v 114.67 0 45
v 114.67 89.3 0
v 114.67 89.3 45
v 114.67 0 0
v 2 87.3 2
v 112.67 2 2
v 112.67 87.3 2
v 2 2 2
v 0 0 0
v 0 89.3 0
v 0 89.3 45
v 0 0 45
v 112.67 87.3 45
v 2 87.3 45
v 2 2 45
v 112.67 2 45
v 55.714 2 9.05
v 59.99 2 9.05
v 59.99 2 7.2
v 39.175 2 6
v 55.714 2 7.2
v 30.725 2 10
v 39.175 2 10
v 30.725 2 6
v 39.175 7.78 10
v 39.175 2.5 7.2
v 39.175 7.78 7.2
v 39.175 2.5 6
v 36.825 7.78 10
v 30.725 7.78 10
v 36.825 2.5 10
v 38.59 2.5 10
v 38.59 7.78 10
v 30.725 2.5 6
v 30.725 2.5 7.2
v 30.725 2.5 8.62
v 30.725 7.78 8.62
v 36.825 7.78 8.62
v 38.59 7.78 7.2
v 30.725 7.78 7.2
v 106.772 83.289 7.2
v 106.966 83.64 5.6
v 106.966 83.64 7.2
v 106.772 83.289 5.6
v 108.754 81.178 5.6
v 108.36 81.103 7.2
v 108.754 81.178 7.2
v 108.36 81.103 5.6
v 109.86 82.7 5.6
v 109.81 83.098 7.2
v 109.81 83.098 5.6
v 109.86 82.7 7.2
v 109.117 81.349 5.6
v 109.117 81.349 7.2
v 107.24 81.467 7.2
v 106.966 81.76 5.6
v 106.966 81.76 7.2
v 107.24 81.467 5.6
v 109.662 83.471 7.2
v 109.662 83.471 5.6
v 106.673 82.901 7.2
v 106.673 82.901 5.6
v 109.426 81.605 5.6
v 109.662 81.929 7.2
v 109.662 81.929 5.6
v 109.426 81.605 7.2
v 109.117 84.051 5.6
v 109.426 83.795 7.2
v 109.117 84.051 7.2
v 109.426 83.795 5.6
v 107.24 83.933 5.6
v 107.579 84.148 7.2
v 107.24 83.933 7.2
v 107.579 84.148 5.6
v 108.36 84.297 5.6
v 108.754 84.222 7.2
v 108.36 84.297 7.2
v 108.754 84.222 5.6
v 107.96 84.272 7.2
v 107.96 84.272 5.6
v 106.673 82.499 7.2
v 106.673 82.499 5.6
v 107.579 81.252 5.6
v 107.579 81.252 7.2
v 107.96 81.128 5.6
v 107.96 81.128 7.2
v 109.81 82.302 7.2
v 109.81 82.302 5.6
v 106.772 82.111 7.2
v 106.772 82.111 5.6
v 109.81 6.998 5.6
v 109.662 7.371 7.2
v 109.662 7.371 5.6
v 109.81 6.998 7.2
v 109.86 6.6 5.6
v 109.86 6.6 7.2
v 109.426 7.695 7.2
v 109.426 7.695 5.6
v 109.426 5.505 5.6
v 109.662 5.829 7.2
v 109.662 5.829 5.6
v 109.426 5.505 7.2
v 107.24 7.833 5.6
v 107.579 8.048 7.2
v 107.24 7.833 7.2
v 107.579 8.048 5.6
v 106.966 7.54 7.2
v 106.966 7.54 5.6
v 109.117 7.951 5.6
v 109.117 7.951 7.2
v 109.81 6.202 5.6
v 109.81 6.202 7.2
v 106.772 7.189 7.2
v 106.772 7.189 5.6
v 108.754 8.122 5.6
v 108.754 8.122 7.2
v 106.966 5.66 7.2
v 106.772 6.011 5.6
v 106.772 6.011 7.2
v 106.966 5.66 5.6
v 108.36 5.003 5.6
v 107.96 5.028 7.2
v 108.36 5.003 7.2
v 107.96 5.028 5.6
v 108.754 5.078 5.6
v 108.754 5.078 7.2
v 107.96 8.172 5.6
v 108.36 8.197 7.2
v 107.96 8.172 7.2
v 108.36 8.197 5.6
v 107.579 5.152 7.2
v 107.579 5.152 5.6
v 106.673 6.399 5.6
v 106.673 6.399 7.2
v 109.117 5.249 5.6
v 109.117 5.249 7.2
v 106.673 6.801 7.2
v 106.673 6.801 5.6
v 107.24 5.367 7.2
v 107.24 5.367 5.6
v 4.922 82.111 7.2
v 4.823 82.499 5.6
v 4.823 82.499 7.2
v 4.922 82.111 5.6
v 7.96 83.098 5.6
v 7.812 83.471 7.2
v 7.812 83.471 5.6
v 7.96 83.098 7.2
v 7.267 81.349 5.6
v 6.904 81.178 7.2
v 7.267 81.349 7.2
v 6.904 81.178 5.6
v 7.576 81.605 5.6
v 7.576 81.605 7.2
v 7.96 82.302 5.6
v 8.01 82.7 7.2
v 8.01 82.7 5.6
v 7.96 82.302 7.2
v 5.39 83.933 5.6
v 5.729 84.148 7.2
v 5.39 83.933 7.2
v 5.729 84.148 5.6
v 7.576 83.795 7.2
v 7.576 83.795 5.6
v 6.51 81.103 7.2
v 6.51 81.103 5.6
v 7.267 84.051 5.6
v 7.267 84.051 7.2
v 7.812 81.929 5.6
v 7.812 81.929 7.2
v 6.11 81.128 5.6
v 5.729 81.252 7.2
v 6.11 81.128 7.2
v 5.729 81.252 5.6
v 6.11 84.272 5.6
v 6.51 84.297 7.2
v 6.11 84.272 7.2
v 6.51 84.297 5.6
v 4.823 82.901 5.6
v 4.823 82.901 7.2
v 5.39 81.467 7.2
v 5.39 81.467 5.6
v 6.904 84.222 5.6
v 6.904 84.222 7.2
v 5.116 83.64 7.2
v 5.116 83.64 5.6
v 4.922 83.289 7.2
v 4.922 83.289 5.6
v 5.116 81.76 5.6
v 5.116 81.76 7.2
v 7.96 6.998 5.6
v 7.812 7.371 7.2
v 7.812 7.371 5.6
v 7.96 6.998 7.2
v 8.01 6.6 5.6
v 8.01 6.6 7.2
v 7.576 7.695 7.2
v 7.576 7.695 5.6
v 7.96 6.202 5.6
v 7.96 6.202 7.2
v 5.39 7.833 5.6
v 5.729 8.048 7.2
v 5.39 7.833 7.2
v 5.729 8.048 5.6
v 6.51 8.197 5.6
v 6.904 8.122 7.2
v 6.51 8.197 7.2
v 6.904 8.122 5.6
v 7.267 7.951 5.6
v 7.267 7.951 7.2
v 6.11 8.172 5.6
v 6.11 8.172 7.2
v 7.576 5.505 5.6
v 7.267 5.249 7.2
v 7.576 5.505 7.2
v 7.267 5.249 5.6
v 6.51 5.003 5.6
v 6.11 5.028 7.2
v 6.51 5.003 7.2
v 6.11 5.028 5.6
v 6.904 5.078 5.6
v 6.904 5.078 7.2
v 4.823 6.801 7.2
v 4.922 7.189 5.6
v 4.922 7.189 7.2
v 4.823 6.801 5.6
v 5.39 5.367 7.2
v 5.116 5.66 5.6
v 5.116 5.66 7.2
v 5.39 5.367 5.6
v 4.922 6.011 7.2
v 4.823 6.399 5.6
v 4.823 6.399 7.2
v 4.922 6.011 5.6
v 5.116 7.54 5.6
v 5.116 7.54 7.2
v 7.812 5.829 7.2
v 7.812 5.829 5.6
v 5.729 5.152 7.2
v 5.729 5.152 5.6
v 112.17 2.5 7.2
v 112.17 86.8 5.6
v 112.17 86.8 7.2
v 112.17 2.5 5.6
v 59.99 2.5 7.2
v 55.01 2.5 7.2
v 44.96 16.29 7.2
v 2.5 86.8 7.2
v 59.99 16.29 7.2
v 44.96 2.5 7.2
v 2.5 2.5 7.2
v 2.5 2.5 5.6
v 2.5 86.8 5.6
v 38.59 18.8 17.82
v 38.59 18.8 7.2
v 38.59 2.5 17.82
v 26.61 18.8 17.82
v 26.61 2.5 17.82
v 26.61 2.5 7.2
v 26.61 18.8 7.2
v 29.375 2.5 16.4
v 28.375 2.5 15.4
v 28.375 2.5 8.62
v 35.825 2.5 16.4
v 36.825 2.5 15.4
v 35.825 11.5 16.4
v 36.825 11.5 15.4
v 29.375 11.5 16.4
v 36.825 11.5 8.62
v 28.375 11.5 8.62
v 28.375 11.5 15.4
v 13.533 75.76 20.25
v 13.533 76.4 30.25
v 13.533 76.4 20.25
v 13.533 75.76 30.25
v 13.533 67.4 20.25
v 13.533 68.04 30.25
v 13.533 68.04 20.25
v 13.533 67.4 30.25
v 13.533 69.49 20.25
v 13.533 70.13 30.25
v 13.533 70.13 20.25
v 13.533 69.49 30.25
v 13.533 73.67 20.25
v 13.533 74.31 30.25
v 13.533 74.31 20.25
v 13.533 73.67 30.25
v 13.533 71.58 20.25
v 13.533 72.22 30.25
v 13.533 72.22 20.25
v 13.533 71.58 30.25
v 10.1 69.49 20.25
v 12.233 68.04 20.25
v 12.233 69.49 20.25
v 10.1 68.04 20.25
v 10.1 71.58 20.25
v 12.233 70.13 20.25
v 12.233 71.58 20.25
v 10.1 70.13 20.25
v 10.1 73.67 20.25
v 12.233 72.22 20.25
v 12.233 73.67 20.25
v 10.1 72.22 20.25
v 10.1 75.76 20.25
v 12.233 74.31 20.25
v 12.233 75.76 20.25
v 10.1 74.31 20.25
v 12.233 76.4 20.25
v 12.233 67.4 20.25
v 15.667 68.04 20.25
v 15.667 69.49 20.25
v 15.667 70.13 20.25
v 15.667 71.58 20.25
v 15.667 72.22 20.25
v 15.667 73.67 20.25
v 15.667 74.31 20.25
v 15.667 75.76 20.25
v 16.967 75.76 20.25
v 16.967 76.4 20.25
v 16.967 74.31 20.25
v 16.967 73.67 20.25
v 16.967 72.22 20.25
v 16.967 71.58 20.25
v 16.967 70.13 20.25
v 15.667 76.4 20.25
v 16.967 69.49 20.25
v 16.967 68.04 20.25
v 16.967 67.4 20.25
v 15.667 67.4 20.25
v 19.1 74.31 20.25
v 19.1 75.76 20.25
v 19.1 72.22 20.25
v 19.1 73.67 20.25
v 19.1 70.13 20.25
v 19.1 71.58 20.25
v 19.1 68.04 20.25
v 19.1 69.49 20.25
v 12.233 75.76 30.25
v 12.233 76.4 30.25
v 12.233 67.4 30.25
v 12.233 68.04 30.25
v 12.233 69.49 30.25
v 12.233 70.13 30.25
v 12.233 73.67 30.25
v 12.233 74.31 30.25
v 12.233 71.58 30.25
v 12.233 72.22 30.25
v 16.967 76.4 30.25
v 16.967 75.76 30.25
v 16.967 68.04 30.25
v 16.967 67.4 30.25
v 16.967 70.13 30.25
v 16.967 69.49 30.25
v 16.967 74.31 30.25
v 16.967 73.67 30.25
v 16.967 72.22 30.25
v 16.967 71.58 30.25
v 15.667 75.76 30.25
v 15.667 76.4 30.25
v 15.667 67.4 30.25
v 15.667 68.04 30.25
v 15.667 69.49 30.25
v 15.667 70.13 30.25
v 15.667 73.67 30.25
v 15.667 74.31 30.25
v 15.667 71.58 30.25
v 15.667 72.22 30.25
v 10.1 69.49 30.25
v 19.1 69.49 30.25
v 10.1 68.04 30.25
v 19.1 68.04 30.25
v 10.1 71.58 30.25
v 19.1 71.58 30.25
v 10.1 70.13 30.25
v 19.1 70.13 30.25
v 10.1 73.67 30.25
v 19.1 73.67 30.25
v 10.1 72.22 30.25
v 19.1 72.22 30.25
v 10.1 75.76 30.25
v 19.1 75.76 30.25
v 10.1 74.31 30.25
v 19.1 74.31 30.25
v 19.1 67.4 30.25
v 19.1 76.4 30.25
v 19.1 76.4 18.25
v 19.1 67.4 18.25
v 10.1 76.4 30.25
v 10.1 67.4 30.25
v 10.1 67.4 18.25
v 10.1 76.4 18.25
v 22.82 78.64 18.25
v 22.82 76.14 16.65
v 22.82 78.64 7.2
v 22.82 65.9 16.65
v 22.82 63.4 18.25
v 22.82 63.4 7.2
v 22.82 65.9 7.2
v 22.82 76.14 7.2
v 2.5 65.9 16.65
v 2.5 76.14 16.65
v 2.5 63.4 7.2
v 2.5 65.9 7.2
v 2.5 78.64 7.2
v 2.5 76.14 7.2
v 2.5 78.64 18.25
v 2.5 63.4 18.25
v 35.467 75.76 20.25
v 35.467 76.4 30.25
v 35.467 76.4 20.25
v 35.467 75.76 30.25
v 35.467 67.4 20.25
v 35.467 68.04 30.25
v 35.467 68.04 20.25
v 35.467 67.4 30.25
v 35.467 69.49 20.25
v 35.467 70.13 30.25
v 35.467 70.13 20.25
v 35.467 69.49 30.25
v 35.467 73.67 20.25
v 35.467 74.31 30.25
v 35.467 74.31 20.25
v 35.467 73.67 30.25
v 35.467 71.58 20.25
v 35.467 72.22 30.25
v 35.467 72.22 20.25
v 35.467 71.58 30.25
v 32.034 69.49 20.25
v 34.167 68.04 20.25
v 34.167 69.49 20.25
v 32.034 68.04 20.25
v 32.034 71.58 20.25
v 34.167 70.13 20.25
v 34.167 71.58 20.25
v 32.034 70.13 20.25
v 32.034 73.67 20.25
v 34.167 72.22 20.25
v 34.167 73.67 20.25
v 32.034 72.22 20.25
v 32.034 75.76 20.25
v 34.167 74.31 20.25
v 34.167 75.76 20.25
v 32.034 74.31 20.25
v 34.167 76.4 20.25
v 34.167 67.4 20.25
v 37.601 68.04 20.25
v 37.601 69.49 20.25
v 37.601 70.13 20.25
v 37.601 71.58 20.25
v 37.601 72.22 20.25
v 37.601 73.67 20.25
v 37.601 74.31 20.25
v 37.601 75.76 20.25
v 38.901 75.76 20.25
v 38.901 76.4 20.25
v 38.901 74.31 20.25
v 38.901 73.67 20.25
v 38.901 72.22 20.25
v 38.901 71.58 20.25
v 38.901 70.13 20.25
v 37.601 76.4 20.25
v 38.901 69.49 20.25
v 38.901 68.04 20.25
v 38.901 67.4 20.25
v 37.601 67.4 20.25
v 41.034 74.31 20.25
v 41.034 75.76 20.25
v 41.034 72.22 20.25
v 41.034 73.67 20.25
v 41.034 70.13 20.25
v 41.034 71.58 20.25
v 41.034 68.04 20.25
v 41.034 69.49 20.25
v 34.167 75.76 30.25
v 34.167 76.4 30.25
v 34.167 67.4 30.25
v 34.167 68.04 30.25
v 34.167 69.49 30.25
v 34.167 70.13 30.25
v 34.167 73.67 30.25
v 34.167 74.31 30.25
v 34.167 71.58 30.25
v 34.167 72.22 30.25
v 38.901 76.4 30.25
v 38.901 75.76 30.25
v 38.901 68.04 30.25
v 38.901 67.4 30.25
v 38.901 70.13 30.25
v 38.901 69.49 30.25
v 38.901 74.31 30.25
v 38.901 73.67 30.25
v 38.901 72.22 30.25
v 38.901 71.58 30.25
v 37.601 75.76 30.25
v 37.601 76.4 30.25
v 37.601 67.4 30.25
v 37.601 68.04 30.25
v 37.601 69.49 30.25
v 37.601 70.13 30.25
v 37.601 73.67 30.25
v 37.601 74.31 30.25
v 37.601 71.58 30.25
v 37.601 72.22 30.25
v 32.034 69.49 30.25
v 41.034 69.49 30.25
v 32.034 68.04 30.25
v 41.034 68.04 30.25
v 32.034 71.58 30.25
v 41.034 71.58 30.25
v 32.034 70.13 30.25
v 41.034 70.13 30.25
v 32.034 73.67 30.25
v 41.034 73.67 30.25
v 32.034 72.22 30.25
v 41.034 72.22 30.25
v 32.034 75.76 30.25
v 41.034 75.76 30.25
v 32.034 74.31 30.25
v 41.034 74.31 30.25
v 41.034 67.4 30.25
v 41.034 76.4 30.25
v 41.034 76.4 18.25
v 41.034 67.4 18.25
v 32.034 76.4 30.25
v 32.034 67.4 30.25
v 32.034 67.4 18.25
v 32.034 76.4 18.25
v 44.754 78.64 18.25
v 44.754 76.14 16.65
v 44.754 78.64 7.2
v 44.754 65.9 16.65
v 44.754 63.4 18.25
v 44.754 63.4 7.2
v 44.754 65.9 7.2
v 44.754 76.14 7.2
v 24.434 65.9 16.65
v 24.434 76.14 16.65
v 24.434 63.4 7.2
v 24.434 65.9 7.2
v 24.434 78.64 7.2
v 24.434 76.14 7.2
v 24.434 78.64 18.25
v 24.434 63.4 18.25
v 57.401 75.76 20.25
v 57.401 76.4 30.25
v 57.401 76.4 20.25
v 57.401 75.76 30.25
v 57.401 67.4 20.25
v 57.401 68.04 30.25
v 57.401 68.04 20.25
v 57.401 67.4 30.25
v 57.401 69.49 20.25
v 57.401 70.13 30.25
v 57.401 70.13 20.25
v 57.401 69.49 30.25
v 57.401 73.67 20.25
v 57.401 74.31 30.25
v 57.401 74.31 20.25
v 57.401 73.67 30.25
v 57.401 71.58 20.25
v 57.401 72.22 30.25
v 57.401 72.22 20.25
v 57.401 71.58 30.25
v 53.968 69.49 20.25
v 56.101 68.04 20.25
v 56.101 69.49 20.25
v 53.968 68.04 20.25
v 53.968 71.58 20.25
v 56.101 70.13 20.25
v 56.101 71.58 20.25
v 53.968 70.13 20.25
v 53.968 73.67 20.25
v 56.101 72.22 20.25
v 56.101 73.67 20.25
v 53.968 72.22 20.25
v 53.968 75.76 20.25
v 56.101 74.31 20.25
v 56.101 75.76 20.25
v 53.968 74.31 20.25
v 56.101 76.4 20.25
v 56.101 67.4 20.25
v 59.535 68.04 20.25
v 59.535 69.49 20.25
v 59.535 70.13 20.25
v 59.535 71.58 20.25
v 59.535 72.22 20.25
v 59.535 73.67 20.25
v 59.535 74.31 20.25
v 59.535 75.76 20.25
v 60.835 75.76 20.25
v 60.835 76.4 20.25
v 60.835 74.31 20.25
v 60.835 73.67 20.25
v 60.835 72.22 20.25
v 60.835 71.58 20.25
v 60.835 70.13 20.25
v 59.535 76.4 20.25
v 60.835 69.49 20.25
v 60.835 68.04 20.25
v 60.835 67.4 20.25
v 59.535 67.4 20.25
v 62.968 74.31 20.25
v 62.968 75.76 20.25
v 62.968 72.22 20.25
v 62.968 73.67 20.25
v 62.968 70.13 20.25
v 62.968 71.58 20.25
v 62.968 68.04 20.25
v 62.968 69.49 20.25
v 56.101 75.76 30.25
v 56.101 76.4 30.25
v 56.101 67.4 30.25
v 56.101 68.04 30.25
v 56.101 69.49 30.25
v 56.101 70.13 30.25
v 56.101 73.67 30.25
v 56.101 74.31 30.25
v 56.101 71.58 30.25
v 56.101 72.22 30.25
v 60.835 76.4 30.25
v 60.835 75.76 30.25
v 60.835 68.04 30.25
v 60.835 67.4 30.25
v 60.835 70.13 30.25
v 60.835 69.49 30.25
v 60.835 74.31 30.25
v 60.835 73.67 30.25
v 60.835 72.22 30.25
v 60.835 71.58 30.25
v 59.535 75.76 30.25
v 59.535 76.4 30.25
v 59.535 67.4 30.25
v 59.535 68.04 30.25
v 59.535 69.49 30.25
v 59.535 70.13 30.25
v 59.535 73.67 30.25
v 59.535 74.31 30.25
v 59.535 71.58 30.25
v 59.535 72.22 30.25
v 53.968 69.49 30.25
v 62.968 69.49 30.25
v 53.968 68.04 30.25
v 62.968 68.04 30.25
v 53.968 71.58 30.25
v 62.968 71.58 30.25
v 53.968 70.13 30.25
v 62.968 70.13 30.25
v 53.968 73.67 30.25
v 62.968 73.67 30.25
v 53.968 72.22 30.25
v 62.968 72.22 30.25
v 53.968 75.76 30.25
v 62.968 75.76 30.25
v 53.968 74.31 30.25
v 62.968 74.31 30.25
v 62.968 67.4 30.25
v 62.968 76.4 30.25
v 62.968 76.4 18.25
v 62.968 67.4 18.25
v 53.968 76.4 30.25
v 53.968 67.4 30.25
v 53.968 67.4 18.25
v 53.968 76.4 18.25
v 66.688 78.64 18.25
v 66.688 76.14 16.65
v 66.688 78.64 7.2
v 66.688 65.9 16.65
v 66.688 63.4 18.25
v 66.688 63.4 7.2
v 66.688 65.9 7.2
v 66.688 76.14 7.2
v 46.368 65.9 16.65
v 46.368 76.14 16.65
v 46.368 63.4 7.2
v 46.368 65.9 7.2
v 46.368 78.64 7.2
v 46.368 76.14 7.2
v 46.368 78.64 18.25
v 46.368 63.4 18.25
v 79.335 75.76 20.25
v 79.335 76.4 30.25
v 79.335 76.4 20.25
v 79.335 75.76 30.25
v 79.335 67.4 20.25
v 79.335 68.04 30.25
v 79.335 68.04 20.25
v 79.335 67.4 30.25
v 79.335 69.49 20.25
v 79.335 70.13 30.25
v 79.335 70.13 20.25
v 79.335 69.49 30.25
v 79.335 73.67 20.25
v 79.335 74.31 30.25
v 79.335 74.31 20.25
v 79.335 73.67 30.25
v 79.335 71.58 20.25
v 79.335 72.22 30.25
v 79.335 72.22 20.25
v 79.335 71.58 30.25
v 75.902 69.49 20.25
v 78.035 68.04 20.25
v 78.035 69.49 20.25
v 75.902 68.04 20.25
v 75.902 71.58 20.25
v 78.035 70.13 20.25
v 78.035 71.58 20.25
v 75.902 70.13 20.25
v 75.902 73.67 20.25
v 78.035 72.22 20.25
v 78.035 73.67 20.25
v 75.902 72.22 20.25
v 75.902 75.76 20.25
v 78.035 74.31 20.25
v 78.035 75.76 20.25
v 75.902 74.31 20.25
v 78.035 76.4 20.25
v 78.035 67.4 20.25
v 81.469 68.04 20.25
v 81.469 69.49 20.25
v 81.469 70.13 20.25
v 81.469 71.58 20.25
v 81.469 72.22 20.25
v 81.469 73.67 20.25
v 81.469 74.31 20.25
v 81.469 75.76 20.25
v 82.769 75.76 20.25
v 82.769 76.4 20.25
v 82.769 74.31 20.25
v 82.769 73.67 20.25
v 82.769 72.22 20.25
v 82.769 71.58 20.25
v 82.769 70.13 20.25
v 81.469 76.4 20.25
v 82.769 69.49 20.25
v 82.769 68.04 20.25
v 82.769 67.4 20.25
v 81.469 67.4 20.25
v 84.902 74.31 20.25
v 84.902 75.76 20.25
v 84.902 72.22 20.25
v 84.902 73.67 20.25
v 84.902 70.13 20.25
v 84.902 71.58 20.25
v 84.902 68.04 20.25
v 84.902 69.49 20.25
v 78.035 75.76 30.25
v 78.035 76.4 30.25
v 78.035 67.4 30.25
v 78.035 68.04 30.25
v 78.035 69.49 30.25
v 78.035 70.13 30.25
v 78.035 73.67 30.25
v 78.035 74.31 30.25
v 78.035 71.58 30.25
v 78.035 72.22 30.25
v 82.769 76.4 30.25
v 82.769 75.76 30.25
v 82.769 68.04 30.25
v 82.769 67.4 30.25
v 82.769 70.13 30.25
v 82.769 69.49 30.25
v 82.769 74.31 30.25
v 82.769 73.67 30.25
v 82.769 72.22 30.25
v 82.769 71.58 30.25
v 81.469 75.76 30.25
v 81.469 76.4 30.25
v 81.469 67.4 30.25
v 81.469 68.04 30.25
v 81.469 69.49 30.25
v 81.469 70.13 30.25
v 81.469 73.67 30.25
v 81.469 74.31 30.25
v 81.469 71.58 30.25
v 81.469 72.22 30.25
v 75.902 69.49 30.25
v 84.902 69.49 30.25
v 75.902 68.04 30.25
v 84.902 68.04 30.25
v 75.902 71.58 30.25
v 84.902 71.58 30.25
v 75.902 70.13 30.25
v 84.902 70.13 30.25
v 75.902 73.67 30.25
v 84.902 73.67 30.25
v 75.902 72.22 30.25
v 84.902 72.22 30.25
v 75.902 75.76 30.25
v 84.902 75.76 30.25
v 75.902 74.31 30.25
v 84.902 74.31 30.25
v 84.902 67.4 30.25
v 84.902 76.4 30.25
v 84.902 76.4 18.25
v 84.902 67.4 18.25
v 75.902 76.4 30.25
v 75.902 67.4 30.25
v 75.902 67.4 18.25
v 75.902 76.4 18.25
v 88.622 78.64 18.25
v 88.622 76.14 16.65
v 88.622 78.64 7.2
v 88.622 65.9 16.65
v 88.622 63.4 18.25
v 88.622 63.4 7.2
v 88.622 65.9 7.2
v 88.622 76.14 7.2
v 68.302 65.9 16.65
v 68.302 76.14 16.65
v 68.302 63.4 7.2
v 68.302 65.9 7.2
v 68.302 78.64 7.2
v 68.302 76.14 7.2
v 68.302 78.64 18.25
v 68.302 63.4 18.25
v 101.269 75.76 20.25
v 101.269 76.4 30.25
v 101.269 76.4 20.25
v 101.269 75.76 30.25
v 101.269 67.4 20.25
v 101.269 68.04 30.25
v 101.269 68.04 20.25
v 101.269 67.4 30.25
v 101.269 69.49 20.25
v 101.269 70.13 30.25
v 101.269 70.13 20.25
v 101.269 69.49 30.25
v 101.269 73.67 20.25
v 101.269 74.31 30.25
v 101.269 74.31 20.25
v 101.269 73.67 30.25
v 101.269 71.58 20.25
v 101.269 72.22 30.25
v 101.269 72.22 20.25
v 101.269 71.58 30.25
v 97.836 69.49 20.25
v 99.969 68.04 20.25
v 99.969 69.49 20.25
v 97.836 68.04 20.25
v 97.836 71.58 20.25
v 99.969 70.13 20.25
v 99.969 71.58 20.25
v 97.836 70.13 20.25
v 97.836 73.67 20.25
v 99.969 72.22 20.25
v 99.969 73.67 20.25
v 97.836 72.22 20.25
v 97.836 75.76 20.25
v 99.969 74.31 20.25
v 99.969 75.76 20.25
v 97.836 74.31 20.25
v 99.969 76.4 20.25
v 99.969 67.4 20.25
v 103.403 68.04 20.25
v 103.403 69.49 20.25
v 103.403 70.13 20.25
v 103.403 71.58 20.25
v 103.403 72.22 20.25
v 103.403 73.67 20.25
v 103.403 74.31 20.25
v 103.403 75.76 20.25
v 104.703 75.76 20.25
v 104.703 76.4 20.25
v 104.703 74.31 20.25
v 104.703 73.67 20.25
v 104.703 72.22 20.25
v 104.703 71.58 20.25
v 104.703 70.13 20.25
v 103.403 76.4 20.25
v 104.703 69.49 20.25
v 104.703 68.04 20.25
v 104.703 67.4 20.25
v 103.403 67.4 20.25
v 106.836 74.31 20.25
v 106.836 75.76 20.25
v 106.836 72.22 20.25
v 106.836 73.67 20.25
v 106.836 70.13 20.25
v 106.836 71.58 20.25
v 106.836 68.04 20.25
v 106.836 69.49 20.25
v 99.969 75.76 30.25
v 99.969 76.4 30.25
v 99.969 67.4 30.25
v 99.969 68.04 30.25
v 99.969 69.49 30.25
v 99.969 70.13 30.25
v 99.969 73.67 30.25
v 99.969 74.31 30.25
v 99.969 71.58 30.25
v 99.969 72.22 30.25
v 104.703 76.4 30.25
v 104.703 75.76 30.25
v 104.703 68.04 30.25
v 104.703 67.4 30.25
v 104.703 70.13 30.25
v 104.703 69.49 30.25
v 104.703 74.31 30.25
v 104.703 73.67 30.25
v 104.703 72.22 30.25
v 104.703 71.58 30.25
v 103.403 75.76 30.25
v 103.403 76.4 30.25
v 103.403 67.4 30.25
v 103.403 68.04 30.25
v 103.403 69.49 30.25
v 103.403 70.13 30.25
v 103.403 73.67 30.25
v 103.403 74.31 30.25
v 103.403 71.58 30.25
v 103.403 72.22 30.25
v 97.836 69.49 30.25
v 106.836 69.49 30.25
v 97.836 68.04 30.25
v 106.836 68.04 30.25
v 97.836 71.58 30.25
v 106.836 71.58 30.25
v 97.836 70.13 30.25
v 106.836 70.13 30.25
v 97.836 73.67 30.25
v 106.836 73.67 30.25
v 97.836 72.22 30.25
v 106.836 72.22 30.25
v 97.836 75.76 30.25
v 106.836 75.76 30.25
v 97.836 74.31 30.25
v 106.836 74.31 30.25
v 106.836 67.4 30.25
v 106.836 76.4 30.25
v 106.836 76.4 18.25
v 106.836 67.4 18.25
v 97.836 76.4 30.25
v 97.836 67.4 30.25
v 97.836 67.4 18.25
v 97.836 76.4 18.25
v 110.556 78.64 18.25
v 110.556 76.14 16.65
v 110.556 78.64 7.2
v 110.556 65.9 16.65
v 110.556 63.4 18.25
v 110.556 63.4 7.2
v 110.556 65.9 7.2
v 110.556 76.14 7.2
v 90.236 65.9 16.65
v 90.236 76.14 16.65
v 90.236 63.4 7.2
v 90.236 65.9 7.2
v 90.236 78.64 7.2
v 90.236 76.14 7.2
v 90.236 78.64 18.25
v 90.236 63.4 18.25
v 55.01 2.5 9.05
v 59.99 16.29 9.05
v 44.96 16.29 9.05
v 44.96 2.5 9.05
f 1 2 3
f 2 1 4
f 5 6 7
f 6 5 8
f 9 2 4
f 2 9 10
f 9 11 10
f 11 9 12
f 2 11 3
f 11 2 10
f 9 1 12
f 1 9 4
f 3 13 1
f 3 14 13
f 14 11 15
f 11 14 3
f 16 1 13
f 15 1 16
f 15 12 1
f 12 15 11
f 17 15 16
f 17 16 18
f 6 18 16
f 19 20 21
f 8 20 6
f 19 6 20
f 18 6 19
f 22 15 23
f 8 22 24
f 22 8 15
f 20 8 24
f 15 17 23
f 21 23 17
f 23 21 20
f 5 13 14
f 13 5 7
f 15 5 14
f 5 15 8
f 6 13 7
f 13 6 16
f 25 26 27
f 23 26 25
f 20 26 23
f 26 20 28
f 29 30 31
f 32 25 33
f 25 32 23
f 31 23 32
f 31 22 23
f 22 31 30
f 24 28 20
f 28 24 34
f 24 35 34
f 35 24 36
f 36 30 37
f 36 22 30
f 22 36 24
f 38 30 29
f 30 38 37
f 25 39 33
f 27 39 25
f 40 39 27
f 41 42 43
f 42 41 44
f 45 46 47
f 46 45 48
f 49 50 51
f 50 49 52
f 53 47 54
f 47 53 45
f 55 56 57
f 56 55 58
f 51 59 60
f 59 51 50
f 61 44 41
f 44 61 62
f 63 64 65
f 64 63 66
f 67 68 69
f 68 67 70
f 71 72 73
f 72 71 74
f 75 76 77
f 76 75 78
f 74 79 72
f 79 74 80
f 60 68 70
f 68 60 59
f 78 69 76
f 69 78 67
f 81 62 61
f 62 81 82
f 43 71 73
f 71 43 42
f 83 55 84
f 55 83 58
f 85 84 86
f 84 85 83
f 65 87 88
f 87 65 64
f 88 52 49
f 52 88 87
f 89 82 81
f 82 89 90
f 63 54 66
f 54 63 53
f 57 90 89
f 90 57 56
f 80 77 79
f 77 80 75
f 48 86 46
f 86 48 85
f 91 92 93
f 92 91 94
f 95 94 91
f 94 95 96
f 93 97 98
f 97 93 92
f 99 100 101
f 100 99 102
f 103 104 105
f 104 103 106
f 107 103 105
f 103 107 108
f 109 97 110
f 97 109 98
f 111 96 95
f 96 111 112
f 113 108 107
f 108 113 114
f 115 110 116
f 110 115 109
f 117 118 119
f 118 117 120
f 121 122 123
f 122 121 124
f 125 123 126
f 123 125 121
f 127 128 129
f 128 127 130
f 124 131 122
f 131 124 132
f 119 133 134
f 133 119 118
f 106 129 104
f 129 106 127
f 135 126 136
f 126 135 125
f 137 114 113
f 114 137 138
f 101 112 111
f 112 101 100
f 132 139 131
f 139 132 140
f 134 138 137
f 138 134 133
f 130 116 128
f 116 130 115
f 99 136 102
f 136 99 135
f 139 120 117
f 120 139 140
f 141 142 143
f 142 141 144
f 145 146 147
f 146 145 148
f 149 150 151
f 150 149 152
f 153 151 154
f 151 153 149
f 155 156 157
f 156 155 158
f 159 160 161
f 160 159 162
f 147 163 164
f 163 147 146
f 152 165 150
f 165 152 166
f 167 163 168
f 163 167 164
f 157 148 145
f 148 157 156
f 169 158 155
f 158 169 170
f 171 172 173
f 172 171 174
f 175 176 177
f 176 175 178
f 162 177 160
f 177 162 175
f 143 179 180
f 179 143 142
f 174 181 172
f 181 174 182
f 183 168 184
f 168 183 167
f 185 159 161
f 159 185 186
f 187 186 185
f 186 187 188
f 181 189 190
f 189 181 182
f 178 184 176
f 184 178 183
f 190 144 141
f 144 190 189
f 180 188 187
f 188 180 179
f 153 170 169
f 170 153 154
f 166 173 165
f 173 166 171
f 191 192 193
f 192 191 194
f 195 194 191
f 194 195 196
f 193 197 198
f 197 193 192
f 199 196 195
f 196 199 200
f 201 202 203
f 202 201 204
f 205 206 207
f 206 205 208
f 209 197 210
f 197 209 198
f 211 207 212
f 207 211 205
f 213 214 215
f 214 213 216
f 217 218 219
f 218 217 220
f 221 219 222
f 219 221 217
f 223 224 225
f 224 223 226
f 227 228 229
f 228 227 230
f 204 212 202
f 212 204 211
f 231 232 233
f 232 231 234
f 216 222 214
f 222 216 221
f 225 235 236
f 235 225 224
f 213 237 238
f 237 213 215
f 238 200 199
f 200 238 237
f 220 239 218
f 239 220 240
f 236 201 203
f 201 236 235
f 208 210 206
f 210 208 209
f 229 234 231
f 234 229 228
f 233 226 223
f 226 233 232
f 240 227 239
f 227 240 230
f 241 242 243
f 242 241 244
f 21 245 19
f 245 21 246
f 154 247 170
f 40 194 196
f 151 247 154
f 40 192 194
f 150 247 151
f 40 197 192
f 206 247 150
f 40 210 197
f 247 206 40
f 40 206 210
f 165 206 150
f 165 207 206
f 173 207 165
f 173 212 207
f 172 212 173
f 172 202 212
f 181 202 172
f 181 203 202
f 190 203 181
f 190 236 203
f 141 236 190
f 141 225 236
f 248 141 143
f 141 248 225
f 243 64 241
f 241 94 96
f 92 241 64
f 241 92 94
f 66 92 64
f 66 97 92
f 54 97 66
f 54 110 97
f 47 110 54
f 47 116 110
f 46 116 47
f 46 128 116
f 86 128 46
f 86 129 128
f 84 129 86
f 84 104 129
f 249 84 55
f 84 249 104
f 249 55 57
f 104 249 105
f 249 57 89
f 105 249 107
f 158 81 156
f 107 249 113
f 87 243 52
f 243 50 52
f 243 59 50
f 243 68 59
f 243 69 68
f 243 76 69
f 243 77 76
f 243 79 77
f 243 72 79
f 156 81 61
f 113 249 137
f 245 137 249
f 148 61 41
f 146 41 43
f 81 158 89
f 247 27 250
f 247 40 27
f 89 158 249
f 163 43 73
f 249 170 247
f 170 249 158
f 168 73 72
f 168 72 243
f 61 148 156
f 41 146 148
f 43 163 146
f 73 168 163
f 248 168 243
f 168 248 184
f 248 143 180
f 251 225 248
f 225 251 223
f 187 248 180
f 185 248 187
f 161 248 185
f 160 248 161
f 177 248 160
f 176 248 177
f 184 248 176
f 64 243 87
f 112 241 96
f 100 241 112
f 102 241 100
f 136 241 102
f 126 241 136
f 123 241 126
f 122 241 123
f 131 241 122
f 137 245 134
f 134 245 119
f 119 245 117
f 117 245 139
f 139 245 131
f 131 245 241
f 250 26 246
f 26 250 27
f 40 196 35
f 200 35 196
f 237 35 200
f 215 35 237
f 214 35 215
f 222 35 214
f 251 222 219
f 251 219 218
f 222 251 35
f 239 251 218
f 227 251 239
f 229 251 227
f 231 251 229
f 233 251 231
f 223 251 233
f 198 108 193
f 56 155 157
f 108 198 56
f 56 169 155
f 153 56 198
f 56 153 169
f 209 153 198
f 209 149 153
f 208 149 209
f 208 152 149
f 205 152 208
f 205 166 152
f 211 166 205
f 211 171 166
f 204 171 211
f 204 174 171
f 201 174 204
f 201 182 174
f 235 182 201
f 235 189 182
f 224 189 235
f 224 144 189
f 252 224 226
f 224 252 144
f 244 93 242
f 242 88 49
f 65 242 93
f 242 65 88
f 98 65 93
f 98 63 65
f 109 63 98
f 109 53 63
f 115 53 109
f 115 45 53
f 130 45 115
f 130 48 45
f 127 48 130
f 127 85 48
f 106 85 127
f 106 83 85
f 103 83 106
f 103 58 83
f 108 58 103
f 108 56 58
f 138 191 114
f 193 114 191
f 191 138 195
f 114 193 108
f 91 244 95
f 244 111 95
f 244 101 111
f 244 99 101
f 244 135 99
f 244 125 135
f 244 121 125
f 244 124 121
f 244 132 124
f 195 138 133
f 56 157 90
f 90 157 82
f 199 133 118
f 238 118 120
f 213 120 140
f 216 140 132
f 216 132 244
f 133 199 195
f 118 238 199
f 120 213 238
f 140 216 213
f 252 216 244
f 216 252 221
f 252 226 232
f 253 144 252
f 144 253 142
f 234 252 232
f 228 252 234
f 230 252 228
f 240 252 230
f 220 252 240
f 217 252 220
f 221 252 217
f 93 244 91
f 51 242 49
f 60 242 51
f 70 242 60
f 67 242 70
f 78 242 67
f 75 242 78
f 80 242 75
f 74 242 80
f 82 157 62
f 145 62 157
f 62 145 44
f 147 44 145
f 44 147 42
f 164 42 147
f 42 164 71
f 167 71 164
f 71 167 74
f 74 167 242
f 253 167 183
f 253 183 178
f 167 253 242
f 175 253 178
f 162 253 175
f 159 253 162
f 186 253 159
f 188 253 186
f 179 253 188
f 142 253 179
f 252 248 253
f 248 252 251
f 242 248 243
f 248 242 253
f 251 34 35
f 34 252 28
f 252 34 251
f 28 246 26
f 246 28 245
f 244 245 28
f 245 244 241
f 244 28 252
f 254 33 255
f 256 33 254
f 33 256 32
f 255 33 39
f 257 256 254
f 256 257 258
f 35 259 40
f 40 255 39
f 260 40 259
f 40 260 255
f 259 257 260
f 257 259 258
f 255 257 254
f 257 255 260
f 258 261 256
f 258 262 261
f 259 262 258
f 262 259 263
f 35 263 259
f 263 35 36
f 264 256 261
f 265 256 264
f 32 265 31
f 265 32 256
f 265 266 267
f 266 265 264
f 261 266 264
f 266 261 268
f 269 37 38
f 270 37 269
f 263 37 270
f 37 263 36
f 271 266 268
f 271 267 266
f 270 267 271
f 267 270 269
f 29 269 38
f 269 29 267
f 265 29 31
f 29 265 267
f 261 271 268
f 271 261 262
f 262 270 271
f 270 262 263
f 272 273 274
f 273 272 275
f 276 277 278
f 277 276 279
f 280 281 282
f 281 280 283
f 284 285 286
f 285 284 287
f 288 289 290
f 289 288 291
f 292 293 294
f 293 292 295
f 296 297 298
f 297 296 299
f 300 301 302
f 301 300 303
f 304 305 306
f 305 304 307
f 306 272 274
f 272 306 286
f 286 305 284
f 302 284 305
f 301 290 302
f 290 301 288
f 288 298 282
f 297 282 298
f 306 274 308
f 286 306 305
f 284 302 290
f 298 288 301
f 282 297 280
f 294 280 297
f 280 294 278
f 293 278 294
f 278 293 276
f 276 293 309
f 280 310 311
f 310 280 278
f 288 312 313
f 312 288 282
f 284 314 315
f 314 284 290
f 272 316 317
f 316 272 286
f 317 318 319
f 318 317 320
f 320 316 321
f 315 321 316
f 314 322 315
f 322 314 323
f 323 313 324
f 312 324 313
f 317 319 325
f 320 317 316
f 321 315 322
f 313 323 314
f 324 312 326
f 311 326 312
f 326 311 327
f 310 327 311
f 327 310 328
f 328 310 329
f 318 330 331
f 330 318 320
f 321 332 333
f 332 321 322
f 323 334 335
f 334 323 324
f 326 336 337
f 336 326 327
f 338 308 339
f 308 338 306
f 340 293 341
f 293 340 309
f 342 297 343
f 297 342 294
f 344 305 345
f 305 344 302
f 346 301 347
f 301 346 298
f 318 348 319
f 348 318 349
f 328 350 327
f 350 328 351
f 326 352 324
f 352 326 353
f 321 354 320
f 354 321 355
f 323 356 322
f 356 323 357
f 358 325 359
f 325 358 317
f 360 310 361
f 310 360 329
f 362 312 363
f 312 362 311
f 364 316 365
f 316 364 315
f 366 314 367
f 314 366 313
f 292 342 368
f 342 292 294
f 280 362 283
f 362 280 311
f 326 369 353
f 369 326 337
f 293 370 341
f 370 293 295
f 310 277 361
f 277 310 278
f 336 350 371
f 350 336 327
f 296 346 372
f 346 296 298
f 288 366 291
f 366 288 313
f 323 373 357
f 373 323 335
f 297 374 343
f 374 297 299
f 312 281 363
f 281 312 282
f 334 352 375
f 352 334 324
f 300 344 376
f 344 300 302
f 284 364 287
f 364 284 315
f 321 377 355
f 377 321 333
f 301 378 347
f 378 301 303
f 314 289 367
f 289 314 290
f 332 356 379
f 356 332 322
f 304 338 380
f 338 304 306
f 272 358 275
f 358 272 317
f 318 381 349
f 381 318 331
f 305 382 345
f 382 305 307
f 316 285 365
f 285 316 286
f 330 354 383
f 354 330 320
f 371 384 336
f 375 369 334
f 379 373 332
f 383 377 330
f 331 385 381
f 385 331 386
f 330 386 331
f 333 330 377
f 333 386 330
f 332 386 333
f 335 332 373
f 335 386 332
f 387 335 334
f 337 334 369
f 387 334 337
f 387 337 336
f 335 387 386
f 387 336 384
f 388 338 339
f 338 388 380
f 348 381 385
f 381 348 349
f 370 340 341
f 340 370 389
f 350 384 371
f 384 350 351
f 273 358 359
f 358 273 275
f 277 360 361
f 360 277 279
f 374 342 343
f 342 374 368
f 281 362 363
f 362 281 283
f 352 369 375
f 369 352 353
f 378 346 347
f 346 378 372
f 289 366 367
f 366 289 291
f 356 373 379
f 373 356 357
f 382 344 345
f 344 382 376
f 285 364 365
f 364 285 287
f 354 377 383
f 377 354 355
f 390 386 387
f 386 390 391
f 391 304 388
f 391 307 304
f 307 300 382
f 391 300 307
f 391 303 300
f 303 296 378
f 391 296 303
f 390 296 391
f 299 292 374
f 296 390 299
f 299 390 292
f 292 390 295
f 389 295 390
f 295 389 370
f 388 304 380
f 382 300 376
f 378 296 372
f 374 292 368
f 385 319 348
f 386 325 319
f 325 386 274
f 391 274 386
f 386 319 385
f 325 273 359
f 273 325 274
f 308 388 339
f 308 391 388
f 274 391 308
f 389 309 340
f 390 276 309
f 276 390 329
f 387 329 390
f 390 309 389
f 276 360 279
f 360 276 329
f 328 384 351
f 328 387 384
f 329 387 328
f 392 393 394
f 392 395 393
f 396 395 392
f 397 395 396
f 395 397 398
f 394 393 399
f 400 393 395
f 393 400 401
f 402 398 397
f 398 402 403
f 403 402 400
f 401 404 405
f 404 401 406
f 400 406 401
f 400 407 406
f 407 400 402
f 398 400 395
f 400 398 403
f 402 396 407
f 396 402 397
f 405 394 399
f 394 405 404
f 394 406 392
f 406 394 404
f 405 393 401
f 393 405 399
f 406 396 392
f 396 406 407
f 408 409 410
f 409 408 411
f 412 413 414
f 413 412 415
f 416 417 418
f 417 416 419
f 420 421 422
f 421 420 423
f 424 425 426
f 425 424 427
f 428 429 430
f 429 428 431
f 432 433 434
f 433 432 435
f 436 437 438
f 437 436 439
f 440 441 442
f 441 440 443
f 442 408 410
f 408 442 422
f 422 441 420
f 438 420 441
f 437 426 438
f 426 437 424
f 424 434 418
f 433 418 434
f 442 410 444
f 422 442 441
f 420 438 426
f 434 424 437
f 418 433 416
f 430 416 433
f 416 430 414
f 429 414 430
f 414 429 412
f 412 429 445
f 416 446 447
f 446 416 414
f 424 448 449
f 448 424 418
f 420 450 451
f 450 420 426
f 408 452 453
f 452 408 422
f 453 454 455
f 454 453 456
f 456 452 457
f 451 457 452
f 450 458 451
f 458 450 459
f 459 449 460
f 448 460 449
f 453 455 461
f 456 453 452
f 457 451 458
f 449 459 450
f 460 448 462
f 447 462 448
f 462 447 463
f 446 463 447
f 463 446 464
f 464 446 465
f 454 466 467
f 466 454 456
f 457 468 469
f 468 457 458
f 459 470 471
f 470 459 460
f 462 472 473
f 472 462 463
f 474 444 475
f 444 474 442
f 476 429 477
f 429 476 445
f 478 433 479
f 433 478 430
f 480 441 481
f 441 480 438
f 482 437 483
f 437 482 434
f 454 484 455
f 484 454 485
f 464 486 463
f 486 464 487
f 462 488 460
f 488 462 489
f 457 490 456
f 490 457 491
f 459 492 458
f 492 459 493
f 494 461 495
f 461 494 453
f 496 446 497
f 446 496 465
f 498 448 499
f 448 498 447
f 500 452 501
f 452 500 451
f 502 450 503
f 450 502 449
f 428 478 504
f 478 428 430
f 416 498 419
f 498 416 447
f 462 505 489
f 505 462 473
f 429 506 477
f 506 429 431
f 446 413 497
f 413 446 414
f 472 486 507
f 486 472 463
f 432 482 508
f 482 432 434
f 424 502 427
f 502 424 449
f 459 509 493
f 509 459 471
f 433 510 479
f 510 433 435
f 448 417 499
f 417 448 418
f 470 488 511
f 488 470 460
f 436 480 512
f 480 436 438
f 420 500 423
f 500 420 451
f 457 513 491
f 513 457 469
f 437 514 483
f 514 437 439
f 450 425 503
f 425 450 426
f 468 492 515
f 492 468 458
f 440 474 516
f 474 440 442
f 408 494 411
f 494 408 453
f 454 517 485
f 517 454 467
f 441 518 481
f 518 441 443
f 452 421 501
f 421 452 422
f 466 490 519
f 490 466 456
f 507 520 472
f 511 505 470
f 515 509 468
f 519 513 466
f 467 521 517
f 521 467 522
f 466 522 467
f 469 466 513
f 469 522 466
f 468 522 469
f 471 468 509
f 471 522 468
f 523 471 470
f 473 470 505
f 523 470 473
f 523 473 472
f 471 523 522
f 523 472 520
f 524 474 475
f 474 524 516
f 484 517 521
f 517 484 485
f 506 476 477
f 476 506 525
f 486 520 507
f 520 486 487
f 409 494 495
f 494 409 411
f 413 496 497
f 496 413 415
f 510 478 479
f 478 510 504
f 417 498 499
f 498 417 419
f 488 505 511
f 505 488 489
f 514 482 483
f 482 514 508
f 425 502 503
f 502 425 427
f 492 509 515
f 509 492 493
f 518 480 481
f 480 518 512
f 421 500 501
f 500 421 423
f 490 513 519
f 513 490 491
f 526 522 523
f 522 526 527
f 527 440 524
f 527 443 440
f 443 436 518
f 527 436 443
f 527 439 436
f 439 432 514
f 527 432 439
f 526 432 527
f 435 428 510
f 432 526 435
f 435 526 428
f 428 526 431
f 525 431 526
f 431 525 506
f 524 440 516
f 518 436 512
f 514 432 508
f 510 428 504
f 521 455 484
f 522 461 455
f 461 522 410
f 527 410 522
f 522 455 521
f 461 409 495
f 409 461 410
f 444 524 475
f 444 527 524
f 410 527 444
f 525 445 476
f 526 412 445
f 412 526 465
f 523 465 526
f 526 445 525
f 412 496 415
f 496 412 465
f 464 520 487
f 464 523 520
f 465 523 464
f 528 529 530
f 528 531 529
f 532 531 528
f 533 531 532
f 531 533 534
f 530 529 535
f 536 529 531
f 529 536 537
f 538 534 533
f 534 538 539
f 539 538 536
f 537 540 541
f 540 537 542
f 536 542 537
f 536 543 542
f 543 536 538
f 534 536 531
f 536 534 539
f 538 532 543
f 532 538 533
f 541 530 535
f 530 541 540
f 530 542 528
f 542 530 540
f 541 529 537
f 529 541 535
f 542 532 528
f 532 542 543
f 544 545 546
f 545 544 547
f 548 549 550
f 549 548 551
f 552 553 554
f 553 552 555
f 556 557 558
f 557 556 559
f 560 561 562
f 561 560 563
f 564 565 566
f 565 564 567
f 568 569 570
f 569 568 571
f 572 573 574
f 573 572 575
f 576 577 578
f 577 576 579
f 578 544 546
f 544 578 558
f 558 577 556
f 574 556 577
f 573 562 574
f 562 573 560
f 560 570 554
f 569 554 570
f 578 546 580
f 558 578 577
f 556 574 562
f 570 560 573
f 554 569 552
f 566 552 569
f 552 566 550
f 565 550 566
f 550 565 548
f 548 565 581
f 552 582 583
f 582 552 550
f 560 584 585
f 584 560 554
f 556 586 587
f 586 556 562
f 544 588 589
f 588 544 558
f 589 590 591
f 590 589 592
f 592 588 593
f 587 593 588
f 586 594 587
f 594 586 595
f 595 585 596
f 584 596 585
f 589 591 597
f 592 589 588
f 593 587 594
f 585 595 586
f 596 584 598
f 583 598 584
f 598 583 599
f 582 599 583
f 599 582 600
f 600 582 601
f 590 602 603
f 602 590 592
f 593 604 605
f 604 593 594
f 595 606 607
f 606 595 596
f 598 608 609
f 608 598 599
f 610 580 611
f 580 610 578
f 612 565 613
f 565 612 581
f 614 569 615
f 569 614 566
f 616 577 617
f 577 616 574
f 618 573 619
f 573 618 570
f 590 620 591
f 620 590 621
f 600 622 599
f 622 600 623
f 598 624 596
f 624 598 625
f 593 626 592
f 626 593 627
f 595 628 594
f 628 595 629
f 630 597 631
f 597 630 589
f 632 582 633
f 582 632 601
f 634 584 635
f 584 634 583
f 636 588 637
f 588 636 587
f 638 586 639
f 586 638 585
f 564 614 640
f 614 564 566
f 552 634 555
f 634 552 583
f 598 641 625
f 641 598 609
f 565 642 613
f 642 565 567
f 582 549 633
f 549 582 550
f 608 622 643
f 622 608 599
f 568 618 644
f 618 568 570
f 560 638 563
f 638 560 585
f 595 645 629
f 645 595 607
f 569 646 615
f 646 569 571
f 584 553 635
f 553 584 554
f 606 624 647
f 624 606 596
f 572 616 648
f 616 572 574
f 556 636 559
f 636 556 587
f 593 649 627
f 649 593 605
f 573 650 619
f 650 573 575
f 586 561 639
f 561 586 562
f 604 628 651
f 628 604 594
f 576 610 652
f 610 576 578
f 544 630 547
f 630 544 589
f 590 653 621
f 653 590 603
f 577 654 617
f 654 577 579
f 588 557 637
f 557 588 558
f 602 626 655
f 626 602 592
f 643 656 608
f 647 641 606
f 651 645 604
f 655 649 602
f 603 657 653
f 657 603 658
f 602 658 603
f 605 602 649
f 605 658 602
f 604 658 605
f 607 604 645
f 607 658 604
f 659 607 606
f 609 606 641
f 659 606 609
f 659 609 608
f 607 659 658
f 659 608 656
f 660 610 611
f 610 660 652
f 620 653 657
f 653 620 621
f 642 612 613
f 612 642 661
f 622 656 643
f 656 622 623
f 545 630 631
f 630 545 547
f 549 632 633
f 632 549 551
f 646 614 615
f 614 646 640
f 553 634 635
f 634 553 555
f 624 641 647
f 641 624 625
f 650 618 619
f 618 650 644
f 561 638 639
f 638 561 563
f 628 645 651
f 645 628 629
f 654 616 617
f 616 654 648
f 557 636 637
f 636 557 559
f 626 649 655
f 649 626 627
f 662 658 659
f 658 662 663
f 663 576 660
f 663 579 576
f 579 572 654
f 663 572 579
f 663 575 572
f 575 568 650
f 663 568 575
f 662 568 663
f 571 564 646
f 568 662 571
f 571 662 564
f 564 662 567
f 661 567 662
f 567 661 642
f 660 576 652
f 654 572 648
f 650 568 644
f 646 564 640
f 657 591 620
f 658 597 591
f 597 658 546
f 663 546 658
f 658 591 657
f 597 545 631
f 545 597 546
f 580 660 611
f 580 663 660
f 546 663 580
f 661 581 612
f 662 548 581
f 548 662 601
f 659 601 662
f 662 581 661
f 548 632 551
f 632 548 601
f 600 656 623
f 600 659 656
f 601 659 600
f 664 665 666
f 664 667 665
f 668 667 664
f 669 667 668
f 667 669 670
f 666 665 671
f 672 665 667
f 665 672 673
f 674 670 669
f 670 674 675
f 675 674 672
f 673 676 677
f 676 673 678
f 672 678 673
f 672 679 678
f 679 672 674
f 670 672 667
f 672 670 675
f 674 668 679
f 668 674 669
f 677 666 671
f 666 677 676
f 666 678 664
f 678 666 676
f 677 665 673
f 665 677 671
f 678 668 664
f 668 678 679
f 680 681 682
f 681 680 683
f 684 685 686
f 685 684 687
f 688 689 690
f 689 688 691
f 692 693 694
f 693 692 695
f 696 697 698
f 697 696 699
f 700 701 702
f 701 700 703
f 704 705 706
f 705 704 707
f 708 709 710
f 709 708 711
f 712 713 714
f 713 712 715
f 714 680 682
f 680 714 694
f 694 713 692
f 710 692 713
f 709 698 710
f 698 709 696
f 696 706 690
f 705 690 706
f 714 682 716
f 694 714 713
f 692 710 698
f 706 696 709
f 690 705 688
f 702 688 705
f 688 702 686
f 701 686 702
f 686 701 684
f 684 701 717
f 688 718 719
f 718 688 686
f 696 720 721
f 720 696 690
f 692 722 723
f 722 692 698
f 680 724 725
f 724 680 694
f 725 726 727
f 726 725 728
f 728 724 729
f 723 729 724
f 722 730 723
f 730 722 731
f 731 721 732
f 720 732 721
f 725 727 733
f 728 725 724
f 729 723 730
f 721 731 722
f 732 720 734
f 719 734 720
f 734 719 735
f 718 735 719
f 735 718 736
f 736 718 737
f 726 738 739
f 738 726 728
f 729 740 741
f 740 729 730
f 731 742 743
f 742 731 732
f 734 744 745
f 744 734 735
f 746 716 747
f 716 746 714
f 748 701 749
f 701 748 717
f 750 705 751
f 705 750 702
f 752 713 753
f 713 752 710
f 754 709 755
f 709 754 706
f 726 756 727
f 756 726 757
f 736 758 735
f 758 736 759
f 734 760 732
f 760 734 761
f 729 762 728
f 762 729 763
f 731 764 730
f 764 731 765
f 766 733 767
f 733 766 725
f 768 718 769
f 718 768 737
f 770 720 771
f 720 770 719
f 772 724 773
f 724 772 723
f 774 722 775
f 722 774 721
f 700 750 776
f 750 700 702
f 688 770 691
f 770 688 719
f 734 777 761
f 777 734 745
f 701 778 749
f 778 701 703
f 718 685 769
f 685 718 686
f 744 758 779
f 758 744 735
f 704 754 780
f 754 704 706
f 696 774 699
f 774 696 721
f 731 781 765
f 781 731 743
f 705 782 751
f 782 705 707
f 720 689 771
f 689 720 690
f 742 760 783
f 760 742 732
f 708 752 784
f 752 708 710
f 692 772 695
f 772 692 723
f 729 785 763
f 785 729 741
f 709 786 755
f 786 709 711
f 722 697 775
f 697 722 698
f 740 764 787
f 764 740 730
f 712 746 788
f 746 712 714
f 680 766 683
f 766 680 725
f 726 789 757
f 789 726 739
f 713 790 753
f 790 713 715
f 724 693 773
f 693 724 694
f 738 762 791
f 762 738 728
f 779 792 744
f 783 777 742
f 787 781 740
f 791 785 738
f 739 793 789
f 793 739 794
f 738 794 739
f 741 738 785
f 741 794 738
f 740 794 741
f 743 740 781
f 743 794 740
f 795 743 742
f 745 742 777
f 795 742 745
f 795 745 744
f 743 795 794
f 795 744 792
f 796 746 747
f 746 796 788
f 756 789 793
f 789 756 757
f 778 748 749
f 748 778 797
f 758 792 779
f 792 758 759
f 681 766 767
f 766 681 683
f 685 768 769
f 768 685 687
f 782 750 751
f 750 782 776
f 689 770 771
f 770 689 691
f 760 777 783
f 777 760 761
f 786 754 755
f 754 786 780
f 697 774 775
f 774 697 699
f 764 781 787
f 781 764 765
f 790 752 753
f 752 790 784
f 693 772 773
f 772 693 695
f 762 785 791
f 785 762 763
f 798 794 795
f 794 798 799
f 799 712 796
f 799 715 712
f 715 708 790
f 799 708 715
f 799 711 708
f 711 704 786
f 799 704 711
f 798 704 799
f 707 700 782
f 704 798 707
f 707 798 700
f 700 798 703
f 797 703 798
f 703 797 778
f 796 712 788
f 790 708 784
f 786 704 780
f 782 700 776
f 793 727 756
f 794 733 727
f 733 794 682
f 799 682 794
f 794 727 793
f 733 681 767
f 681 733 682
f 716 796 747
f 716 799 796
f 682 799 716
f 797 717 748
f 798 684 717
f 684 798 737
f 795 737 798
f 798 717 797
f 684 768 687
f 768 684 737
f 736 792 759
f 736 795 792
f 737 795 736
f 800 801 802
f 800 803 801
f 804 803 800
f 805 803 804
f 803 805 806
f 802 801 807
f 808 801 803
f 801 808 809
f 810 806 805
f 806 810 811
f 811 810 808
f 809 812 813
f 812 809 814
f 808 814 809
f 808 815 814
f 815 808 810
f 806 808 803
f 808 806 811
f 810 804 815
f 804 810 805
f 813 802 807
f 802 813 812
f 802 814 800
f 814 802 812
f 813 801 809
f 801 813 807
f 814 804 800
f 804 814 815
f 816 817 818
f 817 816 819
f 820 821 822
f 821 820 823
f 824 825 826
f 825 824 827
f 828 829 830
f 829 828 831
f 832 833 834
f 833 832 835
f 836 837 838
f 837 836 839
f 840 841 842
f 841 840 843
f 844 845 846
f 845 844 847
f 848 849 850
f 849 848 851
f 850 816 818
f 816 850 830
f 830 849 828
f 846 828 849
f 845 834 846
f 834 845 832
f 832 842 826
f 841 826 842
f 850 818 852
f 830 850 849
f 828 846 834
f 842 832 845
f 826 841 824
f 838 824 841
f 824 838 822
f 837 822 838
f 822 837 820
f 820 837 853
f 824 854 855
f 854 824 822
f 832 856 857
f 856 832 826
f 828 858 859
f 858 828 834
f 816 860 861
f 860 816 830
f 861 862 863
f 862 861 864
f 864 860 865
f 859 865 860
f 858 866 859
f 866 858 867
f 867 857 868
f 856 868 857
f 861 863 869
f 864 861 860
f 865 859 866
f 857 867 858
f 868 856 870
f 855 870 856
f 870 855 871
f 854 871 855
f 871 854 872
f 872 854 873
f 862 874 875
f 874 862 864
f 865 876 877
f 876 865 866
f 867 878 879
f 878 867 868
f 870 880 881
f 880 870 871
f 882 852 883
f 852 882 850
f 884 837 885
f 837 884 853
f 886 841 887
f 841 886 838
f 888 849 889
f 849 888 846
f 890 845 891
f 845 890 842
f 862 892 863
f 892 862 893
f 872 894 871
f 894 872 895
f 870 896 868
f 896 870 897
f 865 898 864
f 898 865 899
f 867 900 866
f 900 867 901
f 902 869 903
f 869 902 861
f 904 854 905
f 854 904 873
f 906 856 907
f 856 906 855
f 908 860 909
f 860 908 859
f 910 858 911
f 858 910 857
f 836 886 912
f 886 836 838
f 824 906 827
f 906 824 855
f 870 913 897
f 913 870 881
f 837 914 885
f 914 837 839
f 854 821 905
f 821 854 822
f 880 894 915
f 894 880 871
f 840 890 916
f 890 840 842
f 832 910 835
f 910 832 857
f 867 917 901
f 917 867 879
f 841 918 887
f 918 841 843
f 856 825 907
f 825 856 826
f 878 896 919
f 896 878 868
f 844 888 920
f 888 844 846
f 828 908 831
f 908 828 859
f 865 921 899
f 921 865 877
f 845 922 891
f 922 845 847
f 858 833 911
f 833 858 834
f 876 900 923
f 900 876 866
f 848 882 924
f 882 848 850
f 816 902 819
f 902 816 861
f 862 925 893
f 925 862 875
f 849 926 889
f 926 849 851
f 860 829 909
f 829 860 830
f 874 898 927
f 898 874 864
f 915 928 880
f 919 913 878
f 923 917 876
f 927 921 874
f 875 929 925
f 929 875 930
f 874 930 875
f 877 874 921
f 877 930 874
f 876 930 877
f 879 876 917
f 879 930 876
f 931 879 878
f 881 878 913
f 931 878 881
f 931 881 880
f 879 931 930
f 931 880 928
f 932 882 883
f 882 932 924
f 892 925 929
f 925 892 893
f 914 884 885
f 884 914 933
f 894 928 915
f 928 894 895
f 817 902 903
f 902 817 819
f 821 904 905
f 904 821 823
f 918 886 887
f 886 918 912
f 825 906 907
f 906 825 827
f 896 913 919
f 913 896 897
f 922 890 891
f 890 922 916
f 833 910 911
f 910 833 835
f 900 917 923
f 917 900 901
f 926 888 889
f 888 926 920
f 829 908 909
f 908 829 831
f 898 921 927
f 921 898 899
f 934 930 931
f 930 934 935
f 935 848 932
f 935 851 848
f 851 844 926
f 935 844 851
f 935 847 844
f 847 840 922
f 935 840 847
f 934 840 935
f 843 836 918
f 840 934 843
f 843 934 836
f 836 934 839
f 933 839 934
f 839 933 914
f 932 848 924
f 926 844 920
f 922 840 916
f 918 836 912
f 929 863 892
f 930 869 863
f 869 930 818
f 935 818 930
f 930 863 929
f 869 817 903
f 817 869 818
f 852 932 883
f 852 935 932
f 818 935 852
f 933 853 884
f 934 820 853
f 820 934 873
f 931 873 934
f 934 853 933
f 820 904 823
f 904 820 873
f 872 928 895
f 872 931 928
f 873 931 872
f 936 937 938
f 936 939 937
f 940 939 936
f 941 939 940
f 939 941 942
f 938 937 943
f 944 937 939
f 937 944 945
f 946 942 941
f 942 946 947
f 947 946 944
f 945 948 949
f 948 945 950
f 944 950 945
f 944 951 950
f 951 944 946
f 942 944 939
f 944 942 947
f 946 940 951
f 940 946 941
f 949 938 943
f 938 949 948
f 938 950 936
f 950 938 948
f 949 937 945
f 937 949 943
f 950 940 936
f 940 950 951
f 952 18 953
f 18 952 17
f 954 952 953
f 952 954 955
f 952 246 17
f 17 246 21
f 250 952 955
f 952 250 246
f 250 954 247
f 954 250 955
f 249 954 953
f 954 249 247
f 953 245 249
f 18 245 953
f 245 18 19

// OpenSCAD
// file: ../vitamins/tmc2130.scad
include <../settings/dimensions.scad>

module tmc2130_pcb() {
    color("DimGrey") {
        cube([tmc_l, tmc_w, tmc_t]);
    }
}

module heatsink() {
    hs_l = 9.0;
    hs_w = 9.0;
    hs_h = 12.0;

    num_fin_y = 5;
    num_fin_x = 3;
    fin_spacing_x = 1.3;
    fin_thickness_x = (hs_l - ((num_fin_x-1)*fin_spacing_x))/num_fin_x;
    fin_spacing_y = 1.45;
    fin_thickness_y = (hs_w - ((num_fin_y-1)*fin_spacing_y))/num_fin_y;

    color("Blue") difference() {
        cube([hs_l, hs_w, hs_h]);

        for (x=[0:num_fin_x-2]) {
            translate([(x+1)*fin_thickness_x+x*fin_spacing_x,-1,2])cube([fin_spacing_x,hs_w+2,hs_h]);
        }

        for (y=[0:num_fin_y-2]) {
            translate([-1,(y+1)*fin_thickness_y+y*fin_spacing_y,2])cube([hs_l+2,fin_spacing_y,hs_h]);
        }
    }
}

tmc2130_pcb();
translate([tmc_l+5,0,0])heatsink();
// file: stepper_stick.scad
include <../settings/dimensions.scad>
use <../vitamins/tmc2130.scad>

module stepper_stick() {
    tmc2130_pcb();
    translate([7.6,4,tmc_t])heatsink();

    color("Black") {
        translate([0,0,-tmc_offset_from_pcb+pcb_t])cube([tmc_l, 2.5, tmc_offset_from_pcb-pcb_t]);
        translate([0,tmc_w-2.5,-tmc_offset_from_pcb+pcb_t])cube([tmc_l, 2.5, tmc_offset_from_pcb-pcb_t]);
    }
}

stepper_stick();
// file: ../vitamins/uSD.scad
module uSD() {
    // Dimensions - mm
    sd_w = 57.49-42.46;
    sd_t = 1.85;
    pts = [[0,0],
           [sd_w,0],
           [sd_w,14.5],
           [11.05,14.5],
           [10.05,13.79],
           [0,13.79]];
    color("Silver") {
        translate([0,14.5,sd_t]) {       
            rotate([180,0,0]) {
                linear_extrude(height=sd_t)polygon(pts);
            }
        }
    }
}

uSD();
// file: ../vitamins/usb_b.scad
module usb_b_plug() {
    // Dimensions - mm
    plug_w = 8.45;
    plug_h = 7.78;
    plug_l = 10.0;

    $fn = 25;

    translate([-plug_w/2,plug_l,-plug_h/2])rotate([90,0,0]) {
        linear_extrude(height=plug_l){
            polygon([[0,0],
                    [plug_w,0],
                    [plug_w,plug_h-1],
                    [plug_w-1,plug_h],
                    [1,plug_h],
                    [0,plug_h-1]]);
        }
    }
}

module usb_b_jack() {
    // Dimensions - mm
    usb_l = 16.3;
    usb_w = 36.09-24.11;
    usb_h = 10.62;

    $fn=25;

    color("Silver")difference() {
        cube([usb_w, usb_l, usb_h]); // main body
        translate([usb_w/2,-1,usb_h/2])usb_b_plug();
    }
}

usb_b_jack();
// file: ../vitamins/pcb.scad
include <../settings/dimensions.scad>

module pcb() {
    color("Green") {
        difference() {
            translate([0,0,pcb_t/2])cube([pcb_l, pcb_w, pcb_t], center=true); // PCB

            for (x_quad=[1,-1]) {
                for (y_quad=[1,-1]) {
                    translate([x_quad*hole_x_spacing/2,y_quad*hole_y_spacing/2,-1])cylinder(h=pcb_t+2, d=hole_dia); // Holes
                }
            }
        }
    }
}

pcb();
// file: ../parts/skrv13_back.scad
include <../settings/dimensions.scad>

case_height = 45;
wall_thickness = 2;

module main_body() {
    // base
    cube([pcb_l+5, pcb_w+5, wall_thickness]);

    // sides
    cube([pcb_l+5,wall_thickness,case_height]);
    translate([0,pcb_w+5-wall_thickness,0])cube([pcb_l+5,wall_thickness,case_height]);
    cube([wall_thickness,pcb_w+5,case_height]);
    translate([pcb_l+5-wall_thickness,0,0])cube([wall_thickness,pcb_w+5,case_height]);

    // USB puchout
    translate([-usb_x,0,wall_thickness+4])cube([8.45,7.78,wall_thickness+2]);

}

main_body();
// file: skr_v1-3.scad
include <../settings/dimensions.scad>
use <../vitamins/pcb.scad>
use <../vitamins/usb_b.scad>
use <../vitamins/uSD.scad>
use <stepper_stick.scad>

module skrV13() {
    pcb();

    translate([usb_x,usb_y,pcb_t])usb_b_jack();

    translate([uSD_x,uSD_y,pcb_t])uSD();

    for (n = [0:4]) {
        pos = (tmc_l * n) + ((pcb_l - (tmc_l*5))/5)*n;
        translate([(-pcb_l/2) + pos, (pcb_w/2) - 23.4,tmc_offset_from_pcb])stepper_stick();
    }
}

skrV13();
// file: ../settings/dimensions.scad
// Defualt Quality
$fn = 25;

// PCB Dimensions - mm
pcb_l = 109.67;
pcb_w = 84.30;
pcb_t = 1.6;

hole_dia = 3.2;
hole_x_spacing = 101.85;
hole_y_spacing = 76.10;

// PCB Component Locations - mm from center
usb_x = (-pcb_l/2) + 24.11;
usb_y = (-pcb_w/2);

uSD_x = (-pcb_l/2) + 42.46;
uSD_y = (-pcb_w/2) - 0.71;

// TMC2130 Dimensions - mm
tmc_l = 20.32;
tmc_w = 15.24;
tmc_t = 1.6;
tmc_offset_from_pcb = 11.05;
// main file
include <../settings/dimensions.scad>
use <skr_v1-3.scad>
use <../parts/skrv13_back.scad>

main_body();
translate([pcb_l/2+(5/2),pcb_w/2+(5/2),pcb_t+4])skrV13();
